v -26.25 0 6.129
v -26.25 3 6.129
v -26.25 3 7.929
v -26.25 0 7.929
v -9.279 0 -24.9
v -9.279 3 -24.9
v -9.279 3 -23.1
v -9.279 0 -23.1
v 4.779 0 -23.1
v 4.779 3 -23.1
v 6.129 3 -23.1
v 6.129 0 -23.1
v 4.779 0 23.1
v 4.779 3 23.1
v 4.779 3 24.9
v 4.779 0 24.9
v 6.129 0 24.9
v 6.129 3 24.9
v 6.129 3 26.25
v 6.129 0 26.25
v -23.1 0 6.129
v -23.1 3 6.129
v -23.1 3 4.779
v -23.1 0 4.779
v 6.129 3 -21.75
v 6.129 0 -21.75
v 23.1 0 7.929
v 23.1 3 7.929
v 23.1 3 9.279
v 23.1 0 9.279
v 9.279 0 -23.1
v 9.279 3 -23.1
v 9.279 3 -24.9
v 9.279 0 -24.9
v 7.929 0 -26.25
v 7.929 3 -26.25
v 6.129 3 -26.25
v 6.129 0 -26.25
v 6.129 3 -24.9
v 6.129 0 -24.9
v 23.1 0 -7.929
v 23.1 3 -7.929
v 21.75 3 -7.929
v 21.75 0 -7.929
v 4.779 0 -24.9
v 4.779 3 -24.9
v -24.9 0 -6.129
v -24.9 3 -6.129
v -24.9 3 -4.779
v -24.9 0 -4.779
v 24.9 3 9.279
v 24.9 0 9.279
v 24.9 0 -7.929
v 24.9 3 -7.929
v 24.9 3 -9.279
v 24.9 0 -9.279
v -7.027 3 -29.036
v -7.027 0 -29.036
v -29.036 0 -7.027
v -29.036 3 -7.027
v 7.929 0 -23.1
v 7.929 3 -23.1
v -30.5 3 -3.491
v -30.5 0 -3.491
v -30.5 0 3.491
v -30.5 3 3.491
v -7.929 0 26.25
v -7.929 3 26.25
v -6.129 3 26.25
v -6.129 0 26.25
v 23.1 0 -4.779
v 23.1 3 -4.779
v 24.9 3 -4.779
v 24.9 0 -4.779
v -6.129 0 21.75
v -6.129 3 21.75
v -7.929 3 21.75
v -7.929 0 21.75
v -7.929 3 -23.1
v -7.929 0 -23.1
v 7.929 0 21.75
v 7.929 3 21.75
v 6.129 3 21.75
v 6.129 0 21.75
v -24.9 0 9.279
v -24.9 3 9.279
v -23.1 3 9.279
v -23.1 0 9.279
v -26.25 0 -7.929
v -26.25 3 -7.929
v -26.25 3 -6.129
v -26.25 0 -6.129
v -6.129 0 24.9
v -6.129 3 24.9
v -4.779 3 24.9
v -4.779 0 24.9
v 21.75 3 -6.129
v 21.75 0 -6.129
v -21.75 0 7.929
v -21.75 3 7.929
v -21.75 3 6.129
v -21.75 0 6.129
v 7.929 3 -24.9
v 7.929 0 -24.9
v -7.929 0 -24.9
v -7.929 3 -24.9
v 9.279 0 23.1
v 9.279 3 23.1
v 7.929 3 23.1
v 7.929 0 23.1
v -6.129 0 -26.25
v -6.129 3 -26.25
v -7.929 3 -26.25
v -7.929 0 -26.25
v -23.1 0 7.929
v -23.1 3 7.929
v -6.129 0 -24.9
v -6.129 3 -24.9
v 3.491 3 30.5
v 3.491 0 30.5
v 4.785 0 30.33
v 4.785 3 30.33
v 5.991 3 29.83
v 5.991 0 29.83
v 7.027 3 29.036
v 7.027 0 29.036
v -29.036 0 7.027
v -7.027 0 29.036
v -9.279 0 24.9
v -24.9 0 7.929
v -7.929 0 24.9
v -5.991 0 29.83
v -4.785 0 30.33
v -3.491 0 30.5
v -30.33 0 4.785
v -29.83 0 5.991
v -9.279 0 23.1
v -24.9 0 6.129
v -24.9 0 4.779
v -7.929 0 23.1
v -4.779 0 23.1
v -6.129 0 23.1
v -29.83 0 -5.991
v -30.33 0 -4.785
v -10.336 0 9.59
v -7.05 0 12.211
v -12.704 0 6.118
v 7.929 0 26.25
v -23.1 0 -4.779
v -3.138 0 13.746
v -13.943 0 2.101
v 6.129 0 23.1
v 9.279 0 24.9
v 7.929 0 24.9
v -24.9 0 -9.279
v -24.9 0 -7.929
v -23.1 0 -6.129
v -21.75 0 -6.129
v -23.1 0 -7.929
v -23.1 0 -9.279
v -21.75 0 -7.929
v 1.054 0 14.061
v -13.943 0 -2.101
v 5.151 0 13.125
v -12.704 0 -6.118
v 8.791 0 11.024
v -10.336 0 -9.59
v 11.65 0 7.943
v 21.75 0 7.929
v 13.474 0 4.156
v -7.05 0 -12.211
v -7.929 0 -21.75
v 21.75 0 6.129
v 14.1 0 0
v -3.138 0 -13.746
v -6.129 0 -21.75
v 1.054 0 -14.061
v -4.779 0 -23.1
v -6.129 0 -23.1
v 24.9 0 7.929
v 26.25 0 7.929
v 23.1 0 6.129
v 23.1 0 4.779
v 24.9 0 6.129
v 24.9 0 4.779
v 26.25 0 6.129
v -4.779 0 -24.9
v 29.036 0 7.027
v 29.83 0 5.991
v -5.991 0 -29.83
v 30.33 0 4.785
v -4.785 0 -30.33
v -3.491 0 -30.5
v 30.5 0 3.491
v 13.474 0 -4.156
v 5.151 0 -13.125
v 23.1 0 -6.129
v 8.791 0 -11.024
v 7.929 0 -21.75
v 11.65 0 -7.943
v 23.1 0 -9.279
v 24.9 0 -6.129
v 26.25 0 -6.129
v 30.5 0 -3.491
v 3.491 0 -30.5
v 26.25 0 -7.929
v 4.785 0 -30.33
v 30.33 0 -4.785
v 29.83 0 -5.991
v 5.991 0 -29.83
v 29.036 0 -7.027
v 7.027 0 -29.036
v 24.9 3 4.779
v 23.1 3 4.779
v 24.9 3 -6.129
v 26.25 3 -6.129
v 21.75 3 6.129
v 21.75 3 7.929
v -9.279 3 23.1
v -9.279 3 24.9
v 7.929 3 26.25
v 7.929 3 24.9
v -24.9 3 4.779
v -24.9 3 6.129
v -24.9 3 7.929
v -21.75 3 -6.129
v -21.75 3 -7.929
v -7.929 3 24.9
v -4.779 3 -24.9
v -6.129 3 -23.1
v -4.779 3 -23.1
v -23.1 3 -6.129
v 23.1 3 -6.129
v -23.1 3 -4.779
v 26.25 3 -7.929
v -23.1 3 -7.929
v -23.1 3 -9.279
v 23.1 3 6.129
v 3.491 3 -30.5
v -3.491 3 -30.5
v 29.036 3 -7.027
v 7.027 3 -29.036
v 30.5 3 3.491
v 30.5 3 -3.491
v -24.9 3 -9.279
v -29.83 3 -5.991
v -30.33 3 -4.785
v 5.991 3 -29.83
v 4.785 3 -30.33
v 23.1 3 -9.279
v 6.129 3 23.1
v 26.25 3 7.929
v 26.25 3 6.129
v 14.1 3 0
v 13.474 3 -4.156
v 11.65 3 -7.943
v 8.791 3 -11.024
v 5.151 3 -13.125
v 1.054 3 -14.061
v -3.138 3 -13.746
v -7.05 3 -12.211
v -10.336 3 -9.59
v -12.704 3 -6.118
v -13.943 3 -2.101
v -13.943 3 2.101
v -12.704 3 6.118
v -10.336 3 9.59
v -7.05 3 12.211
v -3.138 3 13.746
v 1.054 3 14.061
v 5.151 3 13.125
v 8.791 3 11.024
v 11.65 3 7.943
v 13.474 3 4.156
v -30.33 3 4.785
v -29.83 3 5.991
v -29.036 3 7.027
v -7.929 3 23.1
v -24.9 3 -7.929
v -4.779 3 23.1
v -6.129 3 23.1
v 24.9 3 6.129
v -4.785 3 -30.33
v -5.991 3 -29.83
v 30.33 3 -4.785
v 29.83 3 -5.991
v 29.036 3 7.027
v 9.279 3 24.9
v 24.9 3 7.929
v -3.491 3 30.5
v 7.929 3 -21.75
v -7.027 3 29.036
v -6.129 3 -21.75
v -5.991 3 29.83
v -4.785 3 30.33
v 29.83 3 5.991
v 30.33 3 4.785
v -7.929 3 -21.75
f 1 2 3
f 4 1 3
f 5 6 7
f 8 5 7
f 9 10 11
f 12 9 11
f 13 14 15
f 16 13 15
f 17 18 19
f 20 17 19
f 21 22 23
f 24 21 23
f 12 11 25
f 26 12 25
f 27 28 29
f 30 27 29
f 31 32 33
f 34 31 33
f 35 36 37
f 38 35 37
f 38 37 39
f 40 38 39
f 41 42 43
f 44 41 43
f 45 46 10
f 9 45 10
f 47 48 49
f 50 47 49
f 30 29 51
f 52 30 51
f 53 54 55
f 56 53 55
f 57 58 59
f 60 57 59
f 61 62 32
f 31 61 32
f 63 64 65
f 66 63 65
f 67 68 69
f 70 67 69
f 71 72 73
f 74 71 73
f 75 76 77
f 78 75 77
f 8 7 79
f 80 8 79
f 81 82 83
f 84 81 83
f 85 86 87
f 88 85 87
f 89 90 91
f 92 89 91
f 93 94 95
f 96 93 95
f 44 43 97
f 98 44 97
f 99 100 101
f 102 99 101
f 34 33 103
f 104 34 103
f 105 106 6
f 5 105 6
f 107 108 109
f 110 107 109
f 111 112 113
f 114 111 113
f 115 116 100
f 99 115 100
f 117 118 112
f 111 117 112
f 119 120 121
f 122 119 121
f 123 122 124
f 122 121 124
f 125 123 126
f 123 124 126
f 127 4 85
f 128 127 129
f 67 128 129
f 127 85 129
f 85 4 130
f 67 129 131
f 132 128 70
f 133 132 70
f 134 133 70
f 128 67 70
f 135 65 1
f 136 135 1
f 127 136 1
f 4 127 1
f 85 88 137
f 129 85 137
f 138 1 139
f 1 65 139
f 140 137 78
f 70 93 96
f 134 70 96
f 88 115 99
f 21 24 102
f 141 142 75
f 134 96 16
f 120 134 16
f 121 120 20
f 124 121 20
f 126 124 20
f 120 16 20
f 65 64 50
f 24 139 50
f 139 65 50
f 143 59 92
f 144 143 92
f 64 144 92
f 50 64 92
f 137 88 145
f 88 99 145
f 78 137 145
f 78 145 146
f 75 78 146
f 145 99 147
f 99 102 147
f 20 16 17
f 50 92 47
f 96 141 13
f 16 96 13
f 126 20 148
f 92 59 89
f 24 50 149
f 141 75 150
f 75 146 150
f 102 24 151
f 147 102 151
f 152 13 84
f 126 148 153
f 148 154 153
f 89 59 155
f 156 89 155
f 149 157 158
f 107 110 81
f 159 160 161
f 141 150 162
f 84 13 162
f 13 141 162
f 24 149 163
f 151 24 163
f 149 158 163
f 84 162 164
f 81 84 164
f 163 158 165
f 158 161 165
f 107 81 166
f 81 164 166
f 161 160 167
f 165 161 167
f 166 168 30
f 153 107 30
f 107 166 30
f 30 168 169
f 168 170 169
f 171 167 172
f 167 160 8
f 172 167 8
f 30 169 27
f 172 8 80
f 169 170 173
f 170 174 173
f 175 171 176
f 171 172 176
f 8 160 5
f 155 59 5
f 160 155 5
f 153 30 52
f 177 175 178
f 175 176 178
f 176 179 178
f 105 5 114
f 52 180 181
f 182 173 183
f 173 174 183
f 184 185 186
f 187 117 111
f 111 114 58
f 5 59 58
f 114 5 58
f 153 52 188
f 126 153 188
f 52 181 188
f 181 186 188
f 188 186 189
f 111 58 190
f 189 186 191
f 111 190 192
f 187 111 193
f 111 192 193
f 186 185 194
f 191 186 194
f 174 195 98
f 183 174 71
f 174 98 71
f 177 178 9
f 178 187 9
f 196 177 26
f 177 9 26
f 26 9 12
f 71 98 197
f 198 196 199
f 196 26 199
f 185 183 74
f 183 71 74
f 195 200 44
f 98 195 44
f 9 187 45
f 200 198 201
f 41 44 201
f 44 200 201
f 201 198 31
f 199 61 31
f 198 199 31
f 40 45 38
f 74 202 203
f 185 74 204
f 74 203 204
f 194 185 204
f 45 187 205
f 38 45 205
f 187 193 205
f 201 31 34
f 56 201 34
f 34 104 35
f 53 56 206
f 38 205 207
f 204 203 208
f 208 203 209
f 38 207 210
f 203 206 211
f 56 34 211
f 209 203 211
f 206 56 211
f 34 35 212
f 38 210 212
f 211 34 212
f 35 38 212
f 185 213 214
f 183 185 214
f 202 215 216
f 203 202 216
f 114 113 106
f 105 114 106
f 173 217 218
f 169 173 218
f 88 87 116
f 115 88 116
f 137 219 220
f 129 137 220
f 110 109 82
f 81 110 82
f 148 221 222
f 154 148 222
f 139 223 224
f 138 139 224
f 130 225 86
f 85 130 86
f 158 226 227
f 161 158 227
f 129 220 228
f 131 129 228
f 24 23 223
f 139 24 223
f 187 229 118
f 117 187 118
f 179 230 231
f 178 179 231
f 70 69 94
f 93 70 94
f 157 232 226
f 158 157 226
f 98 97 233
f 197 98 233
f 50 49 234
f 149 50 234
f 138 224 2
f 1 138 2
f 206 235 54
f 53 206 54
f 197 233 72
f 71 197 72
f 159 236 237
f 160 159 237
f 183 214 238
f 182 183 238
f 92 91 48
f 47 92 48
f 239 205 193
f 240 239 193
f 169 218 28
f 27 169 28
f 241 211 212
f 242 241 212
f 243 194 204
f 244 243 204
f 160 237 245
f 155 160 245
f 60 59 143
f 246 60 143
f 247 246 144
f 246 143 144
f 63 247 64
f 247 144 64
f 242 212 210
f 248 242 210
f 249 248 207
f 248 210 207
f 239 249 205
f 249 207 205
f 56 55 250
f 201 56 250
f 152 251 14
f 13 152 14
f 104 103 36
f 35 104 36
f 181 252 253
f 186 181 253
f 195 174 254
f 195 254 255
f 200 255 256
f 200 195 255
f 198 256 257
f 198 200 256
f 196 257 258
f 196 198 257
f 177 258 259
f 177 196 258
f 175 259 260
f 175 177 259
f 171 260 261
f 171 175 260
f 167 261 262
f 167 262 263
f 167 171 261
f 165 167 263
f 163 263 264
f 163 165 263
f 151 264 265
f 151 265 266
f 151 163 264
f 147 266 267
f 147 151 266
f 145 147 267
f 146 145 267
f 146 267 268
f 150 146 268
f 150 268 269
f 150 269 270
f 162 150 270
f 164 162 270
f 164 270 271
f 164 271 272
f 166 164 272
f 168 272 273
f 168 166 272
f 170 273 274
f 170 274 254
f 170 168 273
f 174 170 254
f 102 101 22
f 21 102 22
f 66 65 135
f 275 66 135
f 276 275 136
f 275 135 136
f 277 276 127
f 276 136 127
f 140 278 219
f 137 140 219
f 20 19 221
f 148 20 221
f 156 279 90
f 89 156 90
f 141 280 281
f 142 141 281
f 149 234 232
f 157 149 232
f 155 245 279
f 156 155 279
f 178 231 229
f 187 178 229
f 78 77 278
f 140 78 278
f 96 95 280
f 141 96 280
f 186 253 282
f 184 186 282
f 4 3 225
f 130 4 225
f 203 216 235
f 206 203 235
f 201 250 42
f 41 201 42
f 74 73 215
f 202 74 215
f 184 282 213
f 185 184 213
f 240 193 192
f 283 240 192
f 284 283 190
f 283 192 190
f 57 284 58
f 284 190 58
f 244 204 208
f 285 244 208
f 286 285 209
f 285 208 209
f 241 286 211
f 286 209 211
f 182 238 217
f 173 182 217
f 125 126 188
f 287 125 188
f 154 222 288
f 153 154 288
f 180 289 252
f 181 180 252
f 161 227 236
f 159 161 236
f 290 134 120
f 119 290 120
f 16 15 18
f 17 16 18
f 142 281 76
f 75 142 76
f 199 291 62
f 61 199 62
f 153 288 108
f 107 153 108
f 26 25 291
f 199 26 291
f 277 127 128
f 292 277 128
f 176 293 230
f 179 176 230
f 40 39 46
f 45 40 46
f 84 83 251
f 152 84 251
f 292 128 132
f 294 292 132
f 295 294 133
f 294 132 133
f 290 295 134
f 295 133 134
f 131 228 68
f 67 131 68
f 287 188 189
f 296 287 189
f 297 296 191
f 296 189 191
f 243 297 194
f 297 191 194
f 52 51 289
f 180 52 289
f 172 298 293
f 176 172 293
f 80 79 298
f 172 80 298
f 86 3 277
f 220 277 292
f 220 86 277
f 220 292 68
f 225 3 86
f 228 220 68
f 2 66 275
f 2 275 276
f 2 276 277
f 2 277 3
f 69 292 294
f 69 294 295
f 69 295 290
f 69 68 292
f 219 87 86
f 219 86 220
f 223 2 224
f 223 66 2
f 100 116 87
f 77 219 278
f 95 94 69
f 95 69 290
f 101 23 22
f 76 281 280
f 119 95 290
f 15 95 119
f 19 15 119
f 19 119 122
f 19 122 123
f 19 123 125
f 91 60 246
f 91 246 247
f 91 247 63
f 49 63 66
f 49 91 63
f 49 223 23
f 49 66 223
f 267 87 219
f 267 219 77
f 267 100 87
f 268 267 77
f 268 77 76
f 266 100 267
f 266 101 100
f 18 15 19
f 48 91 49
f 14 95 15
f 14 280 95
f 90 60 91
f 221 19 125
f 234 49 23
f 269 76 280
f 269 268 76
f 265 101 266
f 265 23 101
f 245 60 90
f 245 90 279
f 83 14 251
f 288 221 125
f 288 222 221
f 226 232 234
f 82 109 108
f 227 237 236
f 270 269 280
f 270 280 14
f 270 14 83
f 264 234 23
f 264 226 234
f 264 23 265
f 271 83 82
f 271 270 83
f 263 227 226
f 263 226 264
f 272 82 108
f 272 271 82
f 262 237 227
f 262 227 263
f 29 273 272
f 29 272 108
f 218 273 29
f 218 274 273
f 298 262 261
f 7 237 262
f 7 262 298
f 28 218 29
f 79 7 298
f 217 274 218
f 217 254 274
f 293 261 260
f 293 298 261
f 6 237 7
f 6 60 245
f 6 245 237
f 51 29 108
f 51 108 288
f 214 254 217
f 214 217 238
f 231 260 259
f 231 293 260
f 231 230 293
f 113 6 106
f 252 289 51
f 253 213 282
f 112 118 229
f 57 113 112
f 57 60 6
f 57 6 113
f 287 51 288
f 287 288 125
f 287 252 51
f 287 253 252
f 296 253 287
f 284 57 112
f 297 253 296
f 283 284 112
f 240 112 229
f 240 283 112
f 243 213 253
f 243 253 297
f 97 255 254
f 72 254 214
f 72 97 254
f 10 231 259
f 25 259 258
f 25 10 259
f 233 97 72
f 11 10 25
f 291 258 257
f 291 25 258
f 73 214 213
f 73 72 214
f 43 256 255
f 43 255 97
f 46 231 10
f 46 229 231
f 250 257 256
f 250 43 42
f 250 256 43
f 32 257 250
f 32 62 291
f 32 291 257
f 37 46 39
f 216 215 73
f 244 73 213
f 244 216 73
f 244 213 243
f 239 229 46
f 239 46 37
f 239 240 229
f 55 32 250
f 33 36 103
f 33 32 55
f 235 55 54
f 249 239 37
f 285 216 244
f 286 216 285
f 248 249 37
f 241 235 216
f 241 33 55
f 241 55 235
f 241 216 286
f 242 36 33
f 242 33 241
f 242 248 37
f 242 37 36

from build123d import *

# Parameters (mm, degrees)
SKETCH1_R           = 14.1
BOSS_EXTRUDE1_DEPTH = 3
CUT_EXTRUDE1_DEPTH  = 4


with BuildPart() as part:
    # Sketch1 → Boss-Extrude1 (new body)
    with BuildSketch(Plane(origin=(0, 0, 0), x_dir=(1, 0, 0), z_dir=(0, 1, 0))):
        with BuildLine():
            Line((3.491378029, 30.5), (-3.491378029, 30.5))
            ThreePointArc((-3.491378029, 30.5), (-5.40479519, 30.119397663), (-7.026911935, 29.035533906))
            Line((-7.026911935, 29.035533906), (-29.035533906, 7.026911935))
            ThreePointArc((-29.035533906, 7.026911935), (-30.119397663, 5.40479519), (-30.5, 3.491378029))
            Line((-30.5, 3.491378029), (-30.5, -3.491378029))
            ThreePointArc((-30.5, -3.491378029), (-30.119397663, -5.40479519), (-29.035533906, -7.026911935))
            Line((-29.035533906, -7.026911935), (-7.026911935, -29.035533906))
            ThreePointArc((-7.026911935, -29.035533906), (-5.40479519, -30.119397663), (-3.491378029, -30.5))
            Line((-3.491378029, -30.5), (3.491378029, -30.5))
            ThreePointArc((3.491378029, -30.5), (5.40479519, -30.119397663), (7.026911935, -29.035533906))
            Line((7.026911935, -29.035533906), (29.035533906, -7.026911935))
            ThreePointArc((29.035533906, -7.026911935), (30.119397662, -5.404795191), (30.5, -3.491378029))
            Line((30.5, -3.491378029), (30.5, 3.491378029))
            ThreePointArc((30.5, 3.491378029), (30.119397662, 5.40479519), (29.035533906, 7.026911934))
            Line((29.035533906, 7.026911934), (7.026911934, 29.035533906))
            ThreePointArc((7.026911934, 29.035533906), (5.40479519, 30.119397662), (3.491378029, 30.5))
        make_face()
        Circle(SKETCH1_R, mode=Mode.SUBTRACT)
    extrude(amount=BOSS_EXTRUDE1_DEPTH)

    # Sketch2 → Cut-Extrude1 (cut, through all)
    with BuildSketch(Plane(origin=(0, 3, 0), x_dir=(1, 0, 0), z_dir=(0, 1, 0))):
        Polygon((-26.25, 7.929437252), (-26.25, 6.129437252), (-24.9, 6.129437252), (-24.9, 4.779437252), (-23.1, 4.779437252), (-23.1, 6.129437252), (-21.75, 6.129437252), (-21.75, 7.929437252), (-23.1, 7.929437252), (-23.1, 9.279437252), (-24.9, 9.279437252), (-24.9, 7.929437252), align=None)
        Polygon((-23.1, -4.779437252), (-24.9, -4.779437252), (-24.9, -6.129437252), (-26.25, -6.129437252), (-26.25, -7.929437252), (-24.9, -7.929437252), (-24.9, -9.279437252), (-23.1, -9.279437252), (-23.1, -7.929437252), (-21.75, -7.929437252), (-21.75, -6.129437252), (-23.1, -6.129437252), align=None)
        Polygon((7.929437252, 23.1), (9.279437252, 23.1), (9.279437252, 24.9), (7.929437252, 24.9), (7.929437252, 26.25), (6.129437252, 26.25), (6.129437252, 24.9), (4.779437252, 24.9), (4.779437252, 23.1), (6.129437252, 23.1), (6.129437252, 21.75), (7.929437252, 21.75), align=None)
        Polygon((26.25, -7.929437252), (26.25, -6.129437252), (24.9, -6.129437252), (24.9, -4.779437252), (23.1, -4.779437252), (23.1, -6.129437252), (21.75, -6.129437252), (21.75, -7.929437252), (23.1, -7.929437252), (23.1, -9.279437252), (24.9, -9.279437252), (24.9, -7.929437252), align=None)
        Polygon((-4.779437252, 24.9), (-6.129437252, 24.9), (-6.129437252, 26.25), (-7.929437252, 26.25), (-7.929437252, 24.9), (-9.279437252, 24.9), (-9.279437252, 23.1), (-7.929437252, 23.1), (-7.929437252, 21.75), (-6.129437252, 21.75), (-6.129437252, 23.1), (-4.779437252, 23.1), align=None)
        Polygon((26.25, 7.929437252), (24.9, 7.929437252), (24.9, 9.279437252), (23.1, 9.279437252), (23.1, 7.929437252), (21.75, 7.929437252), (21.75, 6.129437252), (23.1, 6.129437252), (23.1, 4.779437252), (24.9, 4.779437252), (24.9, 6.129437252), (26.25, 6.129437252), align=None)
        Polygon((-6.129437252, -26.25), (-6.129437252, -24.9), (-4.779437252, -24.9), (-4.779437252, -23.1), (-6.129437252, -23.1), (-6.129437252, -21.75), (-7.929437252, -21.75), (-7.929437252, -23.1), (-9.279437252, -23.1), (-9.279437252, -24.9), (-7.929437252, -24.9), (-7.929437252, -26.25), align=None)
        Polygon((7.929437252, -26.25), (7.929437252, -24.9), (9.279437252, -24.9), (9.279437252, -23.1), (7.929437252, -23.1), (7.929437252, -21.75), (6.129437252, -21.75), (6.129437252, -23.1), (4.779437252, -23.1), (4.779437252, -24.9), (6.129437252, -24.9), (6.129437252, -26.25), align=None)
    extrude(amount=-CUT_EXTRUDE1_DEPTH, mode=Mode.SUBTRACT)


solid = part.part
